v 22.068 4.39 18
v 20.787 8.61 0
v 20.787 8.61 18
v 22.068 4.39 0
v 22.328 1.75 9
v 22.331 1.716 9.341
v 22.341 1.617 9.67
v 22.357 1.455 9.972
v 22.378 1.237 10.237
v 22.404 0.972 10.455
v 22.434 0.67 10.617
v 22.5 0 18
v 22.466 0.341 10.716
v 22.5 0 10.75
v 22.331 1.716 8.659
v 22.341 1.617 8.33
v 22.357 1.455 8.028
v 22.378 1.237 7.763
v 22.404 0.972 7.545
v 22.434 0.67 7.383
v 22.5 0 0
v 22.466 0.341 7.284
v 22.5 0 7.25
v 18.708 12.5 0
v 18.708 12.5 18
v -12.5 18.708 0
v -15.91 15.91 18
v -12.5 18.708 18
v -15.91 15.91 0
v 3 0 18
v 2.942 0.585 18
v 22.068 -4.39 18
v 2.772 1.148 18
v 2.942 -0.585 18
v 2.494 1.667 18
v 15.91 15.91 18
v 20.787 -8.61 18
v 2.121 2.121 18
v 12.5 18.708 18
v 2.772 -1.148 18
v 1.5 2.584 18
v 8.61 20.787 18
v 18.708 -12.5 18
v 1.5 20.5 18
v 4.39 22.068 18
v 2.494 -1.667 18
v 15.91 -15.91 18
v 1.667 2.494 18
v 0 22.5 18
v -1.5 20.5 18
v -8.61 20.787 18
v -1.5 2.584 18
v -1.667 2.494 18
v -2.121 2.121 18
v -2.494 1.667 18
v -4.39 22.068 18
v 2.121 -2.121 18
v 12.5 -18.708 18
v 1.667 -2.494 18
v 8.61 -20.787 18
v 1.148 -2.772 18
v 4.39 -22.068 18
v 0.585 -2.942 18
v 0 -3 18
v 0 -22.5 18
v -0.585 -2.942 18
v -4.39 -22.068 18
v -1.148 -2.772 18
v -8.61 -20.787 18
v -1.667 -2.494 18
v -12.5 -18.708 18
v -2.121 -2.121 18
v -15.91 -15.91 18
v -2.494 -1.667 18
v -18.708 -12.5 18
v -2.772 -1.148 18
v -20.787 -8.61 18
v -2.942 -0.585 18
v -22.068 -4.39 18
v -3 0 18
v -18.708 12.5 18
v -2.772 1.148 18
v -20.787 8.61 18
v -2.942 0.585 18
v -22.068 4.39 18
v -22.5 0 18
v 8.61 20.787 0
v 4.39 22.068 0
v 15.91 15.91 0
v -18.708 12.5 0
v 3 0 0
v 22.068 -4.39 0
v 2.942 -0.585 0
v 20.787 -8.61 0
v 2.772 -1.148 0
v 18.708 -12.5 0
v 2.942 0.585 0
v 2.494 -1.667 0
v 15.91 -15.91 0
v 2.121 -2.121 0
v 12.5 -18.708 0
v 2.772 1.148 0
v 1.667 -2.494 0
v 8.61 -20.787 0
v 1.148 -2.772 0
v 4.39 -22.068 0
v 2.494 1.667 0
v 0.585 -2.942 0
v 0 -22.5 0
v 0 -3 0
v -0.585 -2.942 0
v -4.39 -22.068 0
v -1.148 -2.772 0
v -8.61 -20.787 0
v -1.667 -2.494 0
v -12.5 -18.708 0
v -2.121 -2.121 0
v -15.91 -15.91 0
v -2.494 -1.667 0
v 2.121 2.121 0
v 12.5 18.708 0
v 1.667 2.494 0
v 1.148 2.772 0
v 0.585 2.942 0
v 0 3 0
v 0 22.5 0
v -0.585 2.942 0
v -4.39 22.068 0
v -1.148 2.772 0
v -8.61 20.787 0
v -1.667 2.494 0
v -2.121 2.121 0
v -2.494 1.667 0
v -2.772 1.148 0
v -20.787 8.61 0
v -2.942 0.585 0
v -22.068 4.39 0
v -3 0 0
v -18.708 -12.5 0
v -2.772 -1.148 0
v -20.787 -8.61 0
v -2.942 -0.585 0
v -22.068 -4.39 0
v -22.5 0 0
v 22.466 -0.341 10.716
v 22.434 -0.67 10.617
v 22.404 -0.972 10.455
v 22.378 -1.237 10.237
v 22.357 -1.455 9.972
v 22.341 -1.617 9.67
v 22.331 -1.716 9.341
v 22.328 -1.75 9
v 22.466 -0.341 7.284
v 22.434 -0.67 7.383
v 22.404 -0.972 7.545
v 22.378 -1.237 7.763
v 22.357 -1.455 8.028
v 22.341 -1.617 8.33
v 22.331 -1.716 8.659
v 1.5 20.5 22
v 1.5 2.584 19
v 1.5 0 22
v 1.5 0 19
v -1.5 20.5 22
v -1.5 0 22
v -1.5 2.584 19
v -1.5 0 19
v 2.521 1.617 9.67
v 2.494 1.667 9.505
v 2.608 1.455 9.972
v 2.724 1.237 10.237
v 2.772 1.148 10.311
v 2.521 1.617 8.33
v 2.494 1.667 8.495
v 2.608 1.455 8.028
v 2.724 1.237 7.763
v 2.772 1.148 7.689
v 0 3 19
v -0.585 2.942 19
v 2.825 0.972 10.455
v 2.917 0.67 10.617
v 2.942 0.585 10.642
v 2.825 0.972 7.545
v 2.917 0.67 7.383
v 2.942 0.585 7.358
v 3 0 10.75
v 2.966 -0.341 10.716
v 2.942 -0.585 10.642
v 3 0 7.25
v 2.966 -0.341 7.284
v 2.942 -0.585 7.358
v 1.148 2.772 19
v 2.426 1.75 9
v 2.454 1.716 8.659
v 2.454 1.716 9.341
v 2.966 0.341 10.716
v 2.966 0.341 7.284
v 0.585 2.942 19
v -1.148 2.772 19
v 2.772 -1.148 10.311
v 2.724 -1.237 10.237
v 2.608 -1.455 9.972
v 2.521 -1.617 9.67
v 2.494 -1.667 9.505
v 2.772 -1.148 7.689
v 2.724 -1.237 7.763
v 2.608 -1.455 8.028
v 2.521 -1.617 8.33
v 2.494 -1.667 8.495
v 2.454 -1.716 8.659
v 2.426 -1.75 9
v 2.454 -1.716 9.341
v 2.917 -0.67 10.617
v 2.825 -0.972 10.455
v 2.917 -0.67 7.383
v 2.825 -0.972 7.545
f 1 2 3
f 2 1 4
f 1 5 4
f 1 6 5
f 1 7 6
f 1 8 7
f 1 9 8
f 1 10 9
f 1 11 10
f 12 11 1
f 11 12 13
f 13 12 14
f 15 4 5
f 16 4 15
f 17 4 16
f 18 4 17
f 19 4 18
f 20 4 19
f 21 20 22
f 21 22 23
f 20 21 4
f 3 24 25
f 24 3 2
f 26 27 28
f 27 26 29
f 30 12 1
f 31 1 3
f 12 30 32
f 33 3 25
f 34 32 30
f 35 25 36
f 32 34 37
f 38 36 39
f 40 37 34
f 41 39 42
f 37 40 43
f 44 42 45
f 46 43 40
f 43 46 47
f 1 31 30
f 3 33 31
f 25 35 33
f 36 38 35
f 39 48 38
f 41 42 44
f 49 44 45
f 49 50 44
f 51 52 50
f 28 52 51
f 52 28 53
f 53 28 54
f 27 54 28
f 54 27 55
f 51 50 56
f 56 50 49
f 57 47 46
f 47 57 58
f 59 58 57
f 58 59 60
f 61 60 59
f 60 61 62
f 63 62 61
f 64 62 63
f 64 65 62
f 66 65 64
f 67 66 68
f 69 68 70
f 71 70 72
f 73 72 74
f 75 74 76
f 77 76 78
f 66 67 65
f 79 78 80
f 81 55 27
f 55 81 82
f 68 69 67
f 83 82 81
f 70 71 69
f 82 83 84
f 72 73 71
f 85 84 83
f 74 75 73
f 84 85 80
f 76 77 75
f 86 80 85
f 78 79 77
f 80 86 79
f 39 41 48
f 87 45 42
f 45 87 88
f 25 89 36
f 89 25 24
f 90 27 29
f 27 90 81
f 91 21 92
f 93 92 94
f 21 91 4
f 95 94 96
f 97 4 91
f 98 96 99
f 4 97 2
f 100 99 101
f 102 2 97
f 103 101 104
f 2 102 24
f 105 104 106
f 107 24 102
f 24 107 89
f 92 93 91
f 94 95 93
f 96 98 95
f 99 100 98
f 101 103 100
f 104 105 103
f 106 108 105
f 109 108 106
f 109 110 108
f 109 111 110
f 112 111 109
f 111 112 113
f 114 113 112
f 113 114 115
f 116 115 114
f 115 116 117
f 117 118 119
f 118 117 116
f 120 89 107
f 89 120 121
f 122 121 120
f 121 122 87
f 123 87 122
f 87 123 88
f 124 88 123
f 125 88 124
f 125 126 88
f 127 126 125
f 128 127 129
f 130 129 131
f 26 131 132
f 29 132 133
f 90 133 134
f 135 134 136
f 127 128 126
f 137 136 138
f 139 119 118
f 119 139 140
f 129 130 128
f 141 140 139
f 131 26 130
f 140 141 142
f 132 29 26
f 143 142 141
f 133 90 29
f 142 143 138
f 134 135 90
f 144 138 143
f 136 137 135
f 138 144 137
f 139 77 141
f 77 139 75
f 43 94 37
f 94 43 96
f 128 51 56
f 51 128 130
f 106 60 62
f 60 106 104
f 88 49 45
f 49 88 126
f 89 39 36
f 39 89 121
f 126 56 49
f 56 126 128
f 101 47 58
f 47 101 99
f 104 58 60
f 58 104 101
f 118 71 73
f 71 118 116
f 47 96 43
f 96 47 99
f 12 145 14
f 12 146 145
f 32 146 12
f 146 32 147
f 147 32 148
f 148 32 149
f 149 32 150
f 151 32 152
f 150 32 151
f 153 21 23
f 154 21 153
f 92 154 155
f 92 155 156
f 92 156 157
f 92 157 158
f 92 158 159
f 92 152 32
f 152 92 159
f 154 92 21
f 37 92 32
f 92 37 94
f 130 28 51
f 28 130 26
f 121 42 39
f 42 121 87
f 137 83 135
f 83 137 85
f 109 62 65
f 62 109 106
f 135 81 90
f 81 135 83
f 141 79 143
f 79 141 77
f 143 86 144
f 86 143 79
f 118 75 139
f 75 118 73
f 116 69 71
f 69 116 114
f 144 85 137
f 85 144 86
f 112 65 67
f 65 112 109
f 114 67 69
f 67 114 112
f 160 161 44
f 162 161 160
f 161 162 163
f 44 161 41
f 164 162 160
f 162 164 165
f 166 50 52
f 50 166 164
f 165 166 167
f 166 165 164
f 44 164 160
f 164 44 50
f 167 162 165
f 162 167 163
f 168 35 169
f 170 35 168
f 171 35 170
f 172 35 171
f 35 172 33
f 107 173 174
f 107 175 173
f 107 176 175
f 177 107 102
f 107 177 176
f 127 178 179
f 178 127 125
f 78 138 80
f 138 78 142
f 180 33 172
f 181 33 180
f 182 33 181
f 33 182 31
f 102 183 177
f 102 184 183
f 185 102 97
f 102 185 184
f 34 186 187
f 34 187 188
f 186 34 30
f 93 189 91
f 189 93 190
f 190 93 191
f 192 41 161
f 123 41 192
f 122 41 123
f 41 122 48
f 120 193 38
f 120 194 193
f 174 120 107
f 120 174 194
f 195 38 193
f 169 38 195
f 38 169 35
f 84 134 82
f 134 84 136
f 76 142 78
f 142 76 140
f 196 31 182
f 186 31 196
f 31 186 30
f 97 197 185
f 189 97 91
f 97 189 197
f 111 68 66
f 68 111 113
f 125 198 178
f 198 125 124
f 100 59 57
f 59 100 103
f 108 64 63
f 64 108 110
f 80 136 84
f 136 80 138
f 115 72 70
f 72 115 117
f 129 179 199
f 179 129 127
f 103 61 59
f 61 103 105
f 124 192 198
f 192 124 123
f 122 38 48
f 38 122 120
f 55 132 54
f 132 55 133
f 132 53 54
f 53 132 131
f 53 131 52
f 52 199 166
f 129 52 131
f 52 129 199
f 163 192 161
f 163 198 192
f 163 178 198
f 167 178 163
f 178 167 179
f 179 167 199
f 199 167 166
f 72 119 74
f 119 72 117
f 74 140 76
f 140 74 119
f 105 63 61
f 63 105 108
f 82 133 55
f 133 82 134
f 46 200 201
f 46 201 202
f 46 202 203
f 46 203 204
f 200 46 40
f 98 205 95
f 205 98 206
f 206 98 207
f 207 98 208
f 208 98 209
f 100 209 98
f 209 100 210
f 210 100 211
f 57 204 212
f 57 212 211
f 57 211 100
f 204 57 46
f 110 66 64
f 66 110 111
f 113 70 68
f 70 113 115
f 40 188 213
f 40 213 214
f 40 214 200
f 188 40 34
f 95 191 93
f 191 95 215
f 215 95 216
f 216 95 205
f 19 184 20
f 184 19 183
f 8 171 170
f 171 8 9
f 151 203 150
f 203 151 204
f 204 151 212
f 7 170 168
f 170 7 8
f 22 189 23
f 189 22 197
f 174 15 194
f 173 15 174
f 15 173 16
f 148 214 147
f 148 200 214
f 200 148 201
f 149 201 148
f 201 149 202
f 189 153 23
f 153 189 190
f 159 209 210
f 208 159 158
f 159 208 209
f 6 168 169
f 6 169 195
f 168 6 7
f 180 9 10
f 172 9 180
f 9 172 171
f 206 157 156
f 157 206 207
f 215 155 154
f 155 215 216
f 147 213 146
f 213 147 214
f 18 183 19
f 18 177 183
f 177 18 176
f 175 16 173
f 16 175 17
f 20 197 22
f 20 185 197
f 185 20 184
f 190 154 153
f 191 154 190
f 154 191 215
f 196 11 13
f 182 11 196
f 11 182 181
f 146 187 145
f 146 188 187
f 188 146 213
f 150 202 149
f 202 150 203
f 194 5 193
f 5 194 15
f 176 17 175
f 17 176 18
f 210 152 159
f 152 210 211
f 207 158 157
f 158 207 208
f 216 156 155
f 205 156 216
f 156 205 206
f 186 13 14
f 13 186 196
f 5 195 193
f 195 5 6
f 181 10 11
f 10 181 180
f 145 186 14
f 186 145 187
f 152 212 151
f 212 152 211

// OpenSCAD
$fn = 32;

// ----------------------------------------------------------------------
// Control knob: pointer knob
// ----------------------------------------------------------------------

// --- parameters (mm) ---
rib_w = 3;                // pointer rib width
rib_h = 5;                // pointer rib height
knob_d = 45;              // knob body diameter
knob_h = 18;              // knob body height
bore_d = 6;               // shaft bore diameter
set_d = 3.5;              // set screw bore diameter

rib_poke = rib_h - 1;  // rib height above the top
total_h = knob_h + rib_h - 1;  // overall height

difference() {
  union() {
    cylinder(h = knob_h, d = knob_d);
    translate([-rib_w / 2, 0, knob_h - 1])
      cube([rib_w, knob_d / 2 - 2, rib_h]);
  }
  translate([0, 0, -1]) cylinder(h = knob_h + 2, d = bore_d);
  translate([-1, 0, knob_h / 2]) rotate([0, 90, 0])
    cylinder(h = knob_d / 2 + bore_d / 2 + 2, d = set_d);}
